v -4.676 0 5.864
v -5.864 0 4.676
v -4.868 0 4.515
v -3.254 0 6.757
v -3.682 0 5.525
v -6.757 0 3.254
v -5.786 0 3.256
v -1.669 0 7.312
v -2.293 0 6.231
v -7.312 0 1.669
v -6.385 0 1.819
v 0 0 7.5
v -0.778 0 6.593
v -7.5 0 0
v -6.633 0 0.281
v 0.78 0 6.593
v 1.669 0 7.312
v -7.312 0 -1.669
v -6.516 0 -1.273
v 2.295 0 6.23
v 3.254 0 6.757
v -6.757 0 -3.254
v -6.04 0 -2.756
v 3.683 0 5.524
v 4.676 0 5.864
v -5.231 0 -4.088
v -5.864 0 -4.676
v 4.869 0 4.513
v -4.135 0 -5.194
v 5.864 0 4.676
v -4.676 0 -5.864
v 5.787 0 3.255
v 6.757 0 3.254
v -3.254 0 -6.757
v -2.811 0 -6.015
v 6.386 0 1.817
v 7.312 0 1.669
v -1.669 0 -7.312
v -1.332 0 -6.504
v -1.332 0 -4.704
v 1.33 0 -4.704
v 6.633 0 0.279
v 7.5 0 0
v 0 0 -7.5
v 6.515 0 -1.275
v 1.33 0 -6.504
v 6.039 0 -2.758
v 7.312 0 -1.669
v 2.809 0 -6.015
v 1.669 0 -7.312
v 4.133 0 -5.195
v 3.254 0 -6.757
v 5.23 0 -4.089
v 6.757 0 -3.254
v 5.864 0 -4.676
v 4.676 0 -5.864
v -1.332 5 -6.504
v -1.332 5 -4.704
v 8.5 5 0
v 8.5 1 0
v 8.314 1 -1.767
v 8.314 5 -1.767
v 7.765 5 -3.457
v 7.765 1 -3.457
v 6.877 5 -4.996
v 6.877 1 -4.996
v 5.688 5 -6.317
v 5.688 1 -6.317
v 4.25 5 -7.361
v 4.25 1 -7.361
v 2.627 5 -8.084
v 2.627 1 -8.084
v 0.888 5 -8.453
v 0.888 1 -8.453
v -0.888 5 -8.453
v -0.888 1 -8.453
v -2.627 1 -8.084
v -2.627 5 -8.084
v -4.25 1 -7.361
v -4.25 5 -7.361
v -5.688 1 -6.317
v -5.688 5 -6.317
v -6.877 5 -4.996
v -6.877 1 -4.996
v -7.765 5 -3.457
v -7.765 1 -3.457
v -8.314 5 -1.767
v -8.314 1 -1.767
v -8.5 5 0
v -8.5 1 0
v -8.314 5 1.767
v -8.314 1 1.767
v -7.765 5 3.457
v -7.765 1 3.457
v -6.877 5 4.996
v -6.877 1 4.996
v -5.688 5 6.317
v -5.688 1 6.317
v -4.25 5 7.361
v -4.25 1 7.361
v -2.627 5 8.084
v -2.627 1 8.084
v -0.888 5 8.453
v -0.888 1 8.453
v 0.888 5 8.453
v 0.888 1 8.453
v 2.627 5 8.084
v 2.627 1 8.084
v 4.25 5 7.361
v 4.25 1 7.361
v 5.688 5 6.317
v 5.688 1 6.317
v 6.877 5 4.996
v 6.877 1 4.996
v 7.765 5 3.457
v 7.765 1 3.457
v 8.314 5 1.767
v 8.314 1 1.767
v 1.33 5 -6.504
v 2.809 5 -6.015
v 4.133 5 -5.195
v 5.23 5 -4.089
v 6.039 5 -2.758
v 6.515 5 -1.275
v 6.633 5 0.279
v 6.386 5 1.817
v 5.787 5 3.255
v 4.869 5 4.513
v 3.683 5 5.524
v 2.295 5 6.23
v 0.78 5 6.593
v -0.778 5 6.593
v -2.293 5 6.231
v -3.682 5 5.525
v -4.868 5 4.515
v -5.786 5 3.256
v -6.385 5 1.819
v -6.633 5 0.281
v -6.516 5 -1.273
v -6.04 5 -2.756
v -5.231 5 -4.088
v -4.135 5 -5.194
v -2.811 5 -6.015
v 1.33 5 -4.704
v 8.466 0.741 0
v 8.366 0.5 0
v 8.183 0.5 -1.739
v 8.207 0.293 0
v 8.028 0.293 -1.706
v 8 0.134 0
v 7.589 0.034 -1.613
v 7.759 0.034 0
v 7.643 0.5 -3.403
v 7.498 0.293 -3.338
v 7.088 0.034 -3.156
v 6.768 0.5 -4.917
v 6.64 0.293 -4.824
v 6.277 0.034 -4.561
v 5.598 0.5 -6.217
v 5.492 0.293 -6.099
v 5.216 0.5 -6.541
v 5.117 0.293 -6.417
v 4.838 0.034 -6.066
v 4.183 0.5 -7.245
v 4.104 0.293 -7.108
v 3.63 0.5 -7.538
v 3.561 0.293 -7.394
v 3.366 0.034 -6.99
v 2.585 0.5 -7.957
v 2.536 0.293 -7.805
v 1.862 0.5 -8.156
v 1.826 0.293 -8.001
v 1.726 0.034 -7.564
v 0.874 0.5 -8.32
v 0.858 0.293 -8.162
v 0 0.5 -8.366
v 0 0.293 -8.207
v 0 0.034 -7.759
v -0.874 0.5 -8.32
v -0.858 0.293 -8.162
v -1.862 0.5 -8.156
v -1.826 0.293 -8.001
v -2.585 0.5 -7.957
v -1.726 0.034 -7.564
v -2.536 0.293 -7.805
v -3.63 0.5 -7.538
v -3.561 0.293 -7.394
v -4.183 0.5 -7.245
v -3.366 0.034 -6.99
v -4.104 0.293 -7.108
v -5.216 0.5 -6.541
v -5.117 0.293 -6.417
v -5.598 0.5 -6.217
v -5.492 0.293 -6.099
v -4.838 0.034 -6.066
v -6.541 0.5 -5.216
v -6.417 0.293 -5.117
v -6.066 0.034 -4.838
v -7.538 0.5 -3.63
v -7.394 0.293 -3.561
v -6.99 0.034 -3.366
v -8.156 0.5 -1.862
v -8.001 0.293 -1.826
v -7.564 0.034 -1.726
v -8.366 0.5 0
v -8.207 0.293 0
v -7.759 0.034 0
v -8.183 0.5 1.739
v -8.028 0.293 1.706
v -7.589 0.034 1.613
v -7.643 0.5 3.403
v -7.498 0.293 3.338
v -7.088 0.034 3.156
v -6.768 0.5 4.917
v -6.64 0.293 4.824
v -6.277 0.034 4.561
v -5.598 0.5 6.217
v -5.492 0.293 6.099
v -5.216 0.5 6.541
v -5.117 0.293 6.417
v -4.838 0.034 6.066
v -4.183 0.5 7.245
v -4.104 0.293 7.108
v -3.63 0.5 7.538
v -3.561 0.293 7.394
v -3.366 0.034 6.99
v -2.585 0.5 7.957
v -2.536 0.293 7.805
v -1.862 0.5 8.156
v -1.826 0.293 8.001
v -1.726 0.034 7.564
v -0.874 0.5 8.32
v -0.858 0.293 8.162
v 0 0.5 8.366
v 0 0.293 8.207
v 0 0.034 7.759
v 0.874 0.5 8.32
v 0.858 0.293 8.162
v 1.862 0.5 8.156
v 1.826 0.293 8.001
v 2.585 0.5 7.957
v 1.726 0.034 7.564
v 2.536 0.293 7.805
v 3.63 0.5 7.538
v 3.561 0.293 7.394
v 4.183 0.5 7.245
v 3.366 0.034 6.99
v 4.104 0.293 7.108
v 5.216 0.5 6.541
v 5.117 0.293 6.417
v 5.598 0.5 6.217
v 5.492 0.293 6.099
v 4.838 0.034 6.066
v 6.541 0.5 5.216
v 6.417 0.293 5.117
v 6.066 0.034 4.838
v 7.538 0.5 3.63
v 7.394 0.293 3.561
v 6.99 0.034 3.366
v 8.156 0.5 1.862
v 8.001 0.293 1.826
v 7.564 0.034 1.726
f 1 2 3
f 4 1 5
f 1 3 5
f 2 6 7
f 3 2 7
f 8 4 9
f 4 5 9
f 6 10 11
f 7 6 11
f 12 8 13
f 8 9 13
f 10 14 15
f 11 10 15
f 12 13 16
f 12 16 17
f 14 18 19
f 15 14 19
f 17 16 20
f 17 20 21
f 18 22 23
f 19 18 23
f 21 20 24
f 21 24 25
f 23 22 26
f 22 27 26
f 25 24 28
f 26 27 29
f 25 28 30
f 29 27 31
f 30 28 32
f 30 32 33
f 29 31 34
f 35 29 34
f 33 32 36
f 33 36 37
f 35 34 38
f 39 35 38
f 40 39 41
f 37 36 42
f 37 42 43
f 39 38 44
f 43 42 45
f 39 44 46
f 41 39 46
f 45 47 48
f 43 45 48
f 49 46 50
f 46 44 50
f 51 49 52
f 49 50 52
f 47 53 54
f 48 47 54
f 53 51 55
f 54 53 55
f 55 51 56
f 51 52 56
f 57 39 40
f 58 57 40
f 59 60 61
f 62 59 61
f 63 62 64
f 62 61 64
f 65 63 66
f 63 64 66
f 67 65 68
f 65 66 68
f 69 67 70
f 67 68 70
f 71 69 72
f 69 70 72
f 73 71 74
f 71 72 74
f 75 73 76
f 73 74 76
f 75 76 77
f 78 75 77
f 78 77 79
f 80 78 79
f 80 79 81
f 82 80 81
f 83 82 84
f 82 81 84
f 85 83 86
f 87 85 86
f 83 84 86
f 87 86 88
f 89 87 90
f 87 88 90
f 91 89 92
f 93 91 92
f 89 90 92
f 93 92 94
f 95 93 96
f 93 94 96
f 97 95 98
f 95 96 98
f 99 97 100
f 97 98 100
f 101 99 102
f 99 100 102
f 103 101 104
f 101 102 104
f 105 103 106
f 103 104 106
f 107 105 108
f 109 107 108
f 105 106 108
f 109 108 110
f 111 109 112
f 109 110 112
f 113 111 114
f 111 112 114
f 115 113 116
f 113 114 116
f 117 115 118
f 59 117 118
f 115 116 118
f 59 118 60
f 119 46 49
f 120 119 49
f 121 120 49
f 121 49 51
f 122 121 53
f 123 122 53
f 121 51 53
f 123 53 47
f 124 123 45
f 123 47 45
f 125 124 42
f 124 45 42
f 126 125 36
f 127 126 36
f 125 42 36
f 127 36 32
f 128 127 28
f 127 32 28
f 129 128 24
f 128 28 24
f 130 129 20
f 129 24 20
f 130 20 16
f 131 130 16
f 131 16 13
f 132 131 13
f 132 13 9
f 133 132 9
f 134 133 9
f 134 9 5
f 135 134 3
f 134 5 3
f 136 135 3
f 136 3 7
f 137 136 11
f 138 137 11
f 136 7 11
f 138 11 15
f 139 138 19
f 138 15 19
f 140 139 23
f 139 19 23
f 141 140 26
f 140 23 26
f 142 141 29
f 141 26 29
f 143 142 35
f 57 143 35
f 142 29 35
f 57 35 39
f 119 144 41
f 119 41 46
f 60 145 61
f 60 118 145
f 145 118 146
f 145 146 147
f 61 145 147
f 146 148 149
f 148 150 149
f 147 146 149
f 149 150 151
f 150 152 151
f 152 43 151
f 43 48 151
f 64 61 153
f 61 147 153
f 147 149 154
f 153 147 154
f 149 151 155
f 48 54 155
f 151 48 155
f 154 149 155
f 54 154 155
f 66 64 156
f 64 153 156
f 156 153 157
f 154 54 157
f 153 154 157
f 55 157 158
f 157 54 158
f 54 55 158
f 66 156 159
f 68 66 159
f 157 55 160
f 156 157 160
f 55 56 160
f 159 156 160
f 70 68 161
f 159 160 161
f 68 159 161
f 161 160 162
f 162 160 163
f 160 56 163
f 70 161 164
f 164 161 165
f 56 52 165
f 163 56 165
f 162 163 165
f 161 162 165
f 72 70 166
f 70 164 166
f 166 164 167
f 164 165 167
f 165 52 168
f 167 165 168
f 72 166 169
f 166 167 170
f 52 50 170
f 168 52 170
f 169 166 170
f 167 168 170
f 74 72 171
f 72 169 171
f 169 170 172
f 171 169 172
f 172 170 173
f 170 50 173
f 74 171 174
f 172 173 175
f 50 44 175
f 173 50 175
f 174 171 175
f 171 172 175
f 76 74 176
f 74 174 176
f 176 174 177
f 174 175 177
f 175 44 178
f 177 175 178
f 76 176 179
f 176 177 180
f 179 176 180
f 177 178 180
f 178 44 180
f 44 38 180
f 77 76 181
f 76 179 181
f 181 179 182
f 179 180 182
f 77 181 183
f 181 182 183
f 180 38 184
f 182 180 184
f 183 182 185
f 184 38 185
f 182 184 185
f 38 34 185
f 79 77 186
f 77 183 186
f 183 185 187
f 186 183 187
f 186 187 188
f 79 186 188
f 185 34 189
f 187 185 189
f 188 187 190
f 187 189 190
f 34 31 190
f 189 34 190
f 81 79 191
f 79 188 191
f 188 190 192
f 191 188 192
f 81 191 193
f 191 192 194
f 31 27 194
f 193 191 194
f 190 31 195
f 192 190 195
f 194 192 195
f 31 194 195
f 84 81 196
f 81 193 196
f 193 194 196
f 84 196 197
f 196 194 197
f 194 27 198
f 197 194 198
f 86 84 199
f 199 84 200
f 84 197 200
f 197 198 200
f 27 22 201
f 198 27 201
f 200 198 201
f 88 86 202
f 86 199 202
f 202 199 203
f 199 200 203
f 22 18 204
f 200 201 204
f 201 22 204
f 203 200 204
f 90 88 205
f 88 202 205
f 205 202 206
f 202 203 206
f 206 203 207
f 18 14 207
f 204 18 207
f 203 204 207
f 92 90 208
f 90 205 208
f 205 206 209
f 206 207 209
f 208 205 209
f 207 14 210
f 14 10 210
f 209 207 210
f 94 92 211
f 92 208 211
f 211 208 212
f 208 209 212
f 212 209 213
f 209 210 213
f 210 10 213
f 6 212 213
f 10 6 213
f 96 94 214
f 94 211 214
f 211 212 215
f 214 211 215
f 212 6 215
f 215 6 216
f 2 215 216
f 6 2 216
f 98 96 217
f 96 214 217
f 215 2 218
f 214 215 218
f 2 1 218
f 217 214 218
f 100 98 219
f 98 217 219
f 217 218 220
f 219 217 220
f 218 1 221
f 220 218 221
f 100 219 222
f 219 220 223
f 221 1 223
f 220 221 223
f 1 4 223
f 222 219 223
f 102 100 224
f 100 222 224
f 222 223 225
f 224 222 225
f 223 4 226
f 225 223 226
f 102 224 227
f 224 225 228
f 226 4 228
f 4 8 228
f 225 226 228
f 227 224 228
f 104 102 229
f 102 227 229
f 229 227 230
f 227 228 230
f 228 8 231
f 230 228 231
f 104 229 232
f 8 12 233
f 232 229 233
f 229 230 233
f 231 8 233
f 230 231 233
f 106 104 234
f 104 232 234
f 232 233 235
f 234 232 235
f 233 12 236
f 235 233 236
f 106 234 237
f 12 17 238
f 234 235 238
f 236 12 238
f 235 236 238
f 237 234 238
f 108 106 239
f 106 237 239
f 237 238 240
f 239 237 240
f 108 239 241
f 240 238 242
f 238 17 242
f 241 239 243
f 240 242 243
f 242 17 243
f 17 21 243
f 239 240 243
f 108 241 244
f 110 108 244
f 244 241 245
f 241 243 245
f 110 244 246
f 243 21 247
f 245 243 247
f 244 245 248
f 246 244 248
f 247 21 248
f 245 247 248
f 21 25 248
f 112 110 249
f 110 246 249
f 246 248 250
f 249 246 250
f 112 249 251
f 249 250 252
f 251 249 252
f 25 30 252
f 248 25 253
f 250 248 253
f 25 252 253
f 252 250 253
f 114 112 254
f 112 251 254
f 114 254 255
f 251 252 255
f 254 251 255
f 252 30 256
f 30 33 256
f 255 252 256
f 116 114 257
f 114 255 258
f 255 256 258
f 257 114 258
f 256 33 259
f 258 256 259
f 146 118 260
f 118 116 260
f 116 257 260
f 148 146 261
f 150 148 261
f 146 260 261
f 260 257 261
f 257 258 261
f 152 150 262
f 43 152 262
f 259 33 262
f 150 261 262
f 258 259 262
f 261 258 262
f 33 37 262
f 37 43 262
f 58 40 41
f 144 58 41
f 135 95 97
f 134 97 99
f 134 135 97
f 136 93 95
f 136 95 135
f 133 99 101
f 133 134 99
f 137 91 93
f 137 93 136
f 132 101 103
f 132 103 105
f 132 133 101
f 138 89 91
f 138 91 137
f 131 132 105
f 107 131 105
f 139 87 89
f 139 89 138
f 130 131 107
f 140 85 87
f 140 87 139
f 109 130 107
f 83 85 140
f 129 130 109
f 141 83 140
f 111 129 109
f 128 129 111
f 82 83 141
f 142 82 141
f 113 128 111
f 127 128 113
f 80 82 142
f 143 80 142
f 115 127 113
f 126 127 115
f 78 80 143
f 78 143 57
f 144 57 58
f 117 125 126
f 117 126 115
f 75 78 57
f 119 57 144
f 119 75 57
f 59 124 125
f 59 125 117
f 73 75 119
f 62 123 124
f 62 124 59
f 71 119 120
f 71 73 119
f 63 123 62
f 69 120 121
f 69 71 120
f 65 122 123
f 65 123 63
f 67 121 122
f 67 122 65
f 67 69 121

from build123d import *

# Parameters (mm, degrees)
SKETCH1_R           = 8.5
BOSS_EXTRUDE1_DEPTH = 5
FILLET3_R           = 1


with BuildPart() as part:
    # Sketch1 → Boss-Extrude1 (new body)
    with BuildSketch(Plane(origin=(0, 0, 0), x_dir=(1, 0, 0), z_dir=(0, 1, 0))):
        Circle(SKETCH1_R)
        with BuildLine():
            Line((-1.332, 6.504006227), (-1.332, 4.704006227))
            Line((-1.332, 4.704006227), (1.33, 4.704006227))
            Line((1.33, 4.704006227), (1.33, 6.5044155))
            ThreePointArc((1.33, 6.5044155), (0.001020723, -6.638999922), (-1.332, 6.504006227))
        make_face(mode=Mode.SUBTRACT)
    extrude(amount=BOSS_EXTRUDE1_DEPTH)

    # Fillet3
    fillet3_edges = [part.edges().sort_by_distance(p)[0] for p in [
        (-8.5, 0, 0),
    ]]
    fillet(fillet3_edges, radius=FILLET3_R)


solid = part.part
